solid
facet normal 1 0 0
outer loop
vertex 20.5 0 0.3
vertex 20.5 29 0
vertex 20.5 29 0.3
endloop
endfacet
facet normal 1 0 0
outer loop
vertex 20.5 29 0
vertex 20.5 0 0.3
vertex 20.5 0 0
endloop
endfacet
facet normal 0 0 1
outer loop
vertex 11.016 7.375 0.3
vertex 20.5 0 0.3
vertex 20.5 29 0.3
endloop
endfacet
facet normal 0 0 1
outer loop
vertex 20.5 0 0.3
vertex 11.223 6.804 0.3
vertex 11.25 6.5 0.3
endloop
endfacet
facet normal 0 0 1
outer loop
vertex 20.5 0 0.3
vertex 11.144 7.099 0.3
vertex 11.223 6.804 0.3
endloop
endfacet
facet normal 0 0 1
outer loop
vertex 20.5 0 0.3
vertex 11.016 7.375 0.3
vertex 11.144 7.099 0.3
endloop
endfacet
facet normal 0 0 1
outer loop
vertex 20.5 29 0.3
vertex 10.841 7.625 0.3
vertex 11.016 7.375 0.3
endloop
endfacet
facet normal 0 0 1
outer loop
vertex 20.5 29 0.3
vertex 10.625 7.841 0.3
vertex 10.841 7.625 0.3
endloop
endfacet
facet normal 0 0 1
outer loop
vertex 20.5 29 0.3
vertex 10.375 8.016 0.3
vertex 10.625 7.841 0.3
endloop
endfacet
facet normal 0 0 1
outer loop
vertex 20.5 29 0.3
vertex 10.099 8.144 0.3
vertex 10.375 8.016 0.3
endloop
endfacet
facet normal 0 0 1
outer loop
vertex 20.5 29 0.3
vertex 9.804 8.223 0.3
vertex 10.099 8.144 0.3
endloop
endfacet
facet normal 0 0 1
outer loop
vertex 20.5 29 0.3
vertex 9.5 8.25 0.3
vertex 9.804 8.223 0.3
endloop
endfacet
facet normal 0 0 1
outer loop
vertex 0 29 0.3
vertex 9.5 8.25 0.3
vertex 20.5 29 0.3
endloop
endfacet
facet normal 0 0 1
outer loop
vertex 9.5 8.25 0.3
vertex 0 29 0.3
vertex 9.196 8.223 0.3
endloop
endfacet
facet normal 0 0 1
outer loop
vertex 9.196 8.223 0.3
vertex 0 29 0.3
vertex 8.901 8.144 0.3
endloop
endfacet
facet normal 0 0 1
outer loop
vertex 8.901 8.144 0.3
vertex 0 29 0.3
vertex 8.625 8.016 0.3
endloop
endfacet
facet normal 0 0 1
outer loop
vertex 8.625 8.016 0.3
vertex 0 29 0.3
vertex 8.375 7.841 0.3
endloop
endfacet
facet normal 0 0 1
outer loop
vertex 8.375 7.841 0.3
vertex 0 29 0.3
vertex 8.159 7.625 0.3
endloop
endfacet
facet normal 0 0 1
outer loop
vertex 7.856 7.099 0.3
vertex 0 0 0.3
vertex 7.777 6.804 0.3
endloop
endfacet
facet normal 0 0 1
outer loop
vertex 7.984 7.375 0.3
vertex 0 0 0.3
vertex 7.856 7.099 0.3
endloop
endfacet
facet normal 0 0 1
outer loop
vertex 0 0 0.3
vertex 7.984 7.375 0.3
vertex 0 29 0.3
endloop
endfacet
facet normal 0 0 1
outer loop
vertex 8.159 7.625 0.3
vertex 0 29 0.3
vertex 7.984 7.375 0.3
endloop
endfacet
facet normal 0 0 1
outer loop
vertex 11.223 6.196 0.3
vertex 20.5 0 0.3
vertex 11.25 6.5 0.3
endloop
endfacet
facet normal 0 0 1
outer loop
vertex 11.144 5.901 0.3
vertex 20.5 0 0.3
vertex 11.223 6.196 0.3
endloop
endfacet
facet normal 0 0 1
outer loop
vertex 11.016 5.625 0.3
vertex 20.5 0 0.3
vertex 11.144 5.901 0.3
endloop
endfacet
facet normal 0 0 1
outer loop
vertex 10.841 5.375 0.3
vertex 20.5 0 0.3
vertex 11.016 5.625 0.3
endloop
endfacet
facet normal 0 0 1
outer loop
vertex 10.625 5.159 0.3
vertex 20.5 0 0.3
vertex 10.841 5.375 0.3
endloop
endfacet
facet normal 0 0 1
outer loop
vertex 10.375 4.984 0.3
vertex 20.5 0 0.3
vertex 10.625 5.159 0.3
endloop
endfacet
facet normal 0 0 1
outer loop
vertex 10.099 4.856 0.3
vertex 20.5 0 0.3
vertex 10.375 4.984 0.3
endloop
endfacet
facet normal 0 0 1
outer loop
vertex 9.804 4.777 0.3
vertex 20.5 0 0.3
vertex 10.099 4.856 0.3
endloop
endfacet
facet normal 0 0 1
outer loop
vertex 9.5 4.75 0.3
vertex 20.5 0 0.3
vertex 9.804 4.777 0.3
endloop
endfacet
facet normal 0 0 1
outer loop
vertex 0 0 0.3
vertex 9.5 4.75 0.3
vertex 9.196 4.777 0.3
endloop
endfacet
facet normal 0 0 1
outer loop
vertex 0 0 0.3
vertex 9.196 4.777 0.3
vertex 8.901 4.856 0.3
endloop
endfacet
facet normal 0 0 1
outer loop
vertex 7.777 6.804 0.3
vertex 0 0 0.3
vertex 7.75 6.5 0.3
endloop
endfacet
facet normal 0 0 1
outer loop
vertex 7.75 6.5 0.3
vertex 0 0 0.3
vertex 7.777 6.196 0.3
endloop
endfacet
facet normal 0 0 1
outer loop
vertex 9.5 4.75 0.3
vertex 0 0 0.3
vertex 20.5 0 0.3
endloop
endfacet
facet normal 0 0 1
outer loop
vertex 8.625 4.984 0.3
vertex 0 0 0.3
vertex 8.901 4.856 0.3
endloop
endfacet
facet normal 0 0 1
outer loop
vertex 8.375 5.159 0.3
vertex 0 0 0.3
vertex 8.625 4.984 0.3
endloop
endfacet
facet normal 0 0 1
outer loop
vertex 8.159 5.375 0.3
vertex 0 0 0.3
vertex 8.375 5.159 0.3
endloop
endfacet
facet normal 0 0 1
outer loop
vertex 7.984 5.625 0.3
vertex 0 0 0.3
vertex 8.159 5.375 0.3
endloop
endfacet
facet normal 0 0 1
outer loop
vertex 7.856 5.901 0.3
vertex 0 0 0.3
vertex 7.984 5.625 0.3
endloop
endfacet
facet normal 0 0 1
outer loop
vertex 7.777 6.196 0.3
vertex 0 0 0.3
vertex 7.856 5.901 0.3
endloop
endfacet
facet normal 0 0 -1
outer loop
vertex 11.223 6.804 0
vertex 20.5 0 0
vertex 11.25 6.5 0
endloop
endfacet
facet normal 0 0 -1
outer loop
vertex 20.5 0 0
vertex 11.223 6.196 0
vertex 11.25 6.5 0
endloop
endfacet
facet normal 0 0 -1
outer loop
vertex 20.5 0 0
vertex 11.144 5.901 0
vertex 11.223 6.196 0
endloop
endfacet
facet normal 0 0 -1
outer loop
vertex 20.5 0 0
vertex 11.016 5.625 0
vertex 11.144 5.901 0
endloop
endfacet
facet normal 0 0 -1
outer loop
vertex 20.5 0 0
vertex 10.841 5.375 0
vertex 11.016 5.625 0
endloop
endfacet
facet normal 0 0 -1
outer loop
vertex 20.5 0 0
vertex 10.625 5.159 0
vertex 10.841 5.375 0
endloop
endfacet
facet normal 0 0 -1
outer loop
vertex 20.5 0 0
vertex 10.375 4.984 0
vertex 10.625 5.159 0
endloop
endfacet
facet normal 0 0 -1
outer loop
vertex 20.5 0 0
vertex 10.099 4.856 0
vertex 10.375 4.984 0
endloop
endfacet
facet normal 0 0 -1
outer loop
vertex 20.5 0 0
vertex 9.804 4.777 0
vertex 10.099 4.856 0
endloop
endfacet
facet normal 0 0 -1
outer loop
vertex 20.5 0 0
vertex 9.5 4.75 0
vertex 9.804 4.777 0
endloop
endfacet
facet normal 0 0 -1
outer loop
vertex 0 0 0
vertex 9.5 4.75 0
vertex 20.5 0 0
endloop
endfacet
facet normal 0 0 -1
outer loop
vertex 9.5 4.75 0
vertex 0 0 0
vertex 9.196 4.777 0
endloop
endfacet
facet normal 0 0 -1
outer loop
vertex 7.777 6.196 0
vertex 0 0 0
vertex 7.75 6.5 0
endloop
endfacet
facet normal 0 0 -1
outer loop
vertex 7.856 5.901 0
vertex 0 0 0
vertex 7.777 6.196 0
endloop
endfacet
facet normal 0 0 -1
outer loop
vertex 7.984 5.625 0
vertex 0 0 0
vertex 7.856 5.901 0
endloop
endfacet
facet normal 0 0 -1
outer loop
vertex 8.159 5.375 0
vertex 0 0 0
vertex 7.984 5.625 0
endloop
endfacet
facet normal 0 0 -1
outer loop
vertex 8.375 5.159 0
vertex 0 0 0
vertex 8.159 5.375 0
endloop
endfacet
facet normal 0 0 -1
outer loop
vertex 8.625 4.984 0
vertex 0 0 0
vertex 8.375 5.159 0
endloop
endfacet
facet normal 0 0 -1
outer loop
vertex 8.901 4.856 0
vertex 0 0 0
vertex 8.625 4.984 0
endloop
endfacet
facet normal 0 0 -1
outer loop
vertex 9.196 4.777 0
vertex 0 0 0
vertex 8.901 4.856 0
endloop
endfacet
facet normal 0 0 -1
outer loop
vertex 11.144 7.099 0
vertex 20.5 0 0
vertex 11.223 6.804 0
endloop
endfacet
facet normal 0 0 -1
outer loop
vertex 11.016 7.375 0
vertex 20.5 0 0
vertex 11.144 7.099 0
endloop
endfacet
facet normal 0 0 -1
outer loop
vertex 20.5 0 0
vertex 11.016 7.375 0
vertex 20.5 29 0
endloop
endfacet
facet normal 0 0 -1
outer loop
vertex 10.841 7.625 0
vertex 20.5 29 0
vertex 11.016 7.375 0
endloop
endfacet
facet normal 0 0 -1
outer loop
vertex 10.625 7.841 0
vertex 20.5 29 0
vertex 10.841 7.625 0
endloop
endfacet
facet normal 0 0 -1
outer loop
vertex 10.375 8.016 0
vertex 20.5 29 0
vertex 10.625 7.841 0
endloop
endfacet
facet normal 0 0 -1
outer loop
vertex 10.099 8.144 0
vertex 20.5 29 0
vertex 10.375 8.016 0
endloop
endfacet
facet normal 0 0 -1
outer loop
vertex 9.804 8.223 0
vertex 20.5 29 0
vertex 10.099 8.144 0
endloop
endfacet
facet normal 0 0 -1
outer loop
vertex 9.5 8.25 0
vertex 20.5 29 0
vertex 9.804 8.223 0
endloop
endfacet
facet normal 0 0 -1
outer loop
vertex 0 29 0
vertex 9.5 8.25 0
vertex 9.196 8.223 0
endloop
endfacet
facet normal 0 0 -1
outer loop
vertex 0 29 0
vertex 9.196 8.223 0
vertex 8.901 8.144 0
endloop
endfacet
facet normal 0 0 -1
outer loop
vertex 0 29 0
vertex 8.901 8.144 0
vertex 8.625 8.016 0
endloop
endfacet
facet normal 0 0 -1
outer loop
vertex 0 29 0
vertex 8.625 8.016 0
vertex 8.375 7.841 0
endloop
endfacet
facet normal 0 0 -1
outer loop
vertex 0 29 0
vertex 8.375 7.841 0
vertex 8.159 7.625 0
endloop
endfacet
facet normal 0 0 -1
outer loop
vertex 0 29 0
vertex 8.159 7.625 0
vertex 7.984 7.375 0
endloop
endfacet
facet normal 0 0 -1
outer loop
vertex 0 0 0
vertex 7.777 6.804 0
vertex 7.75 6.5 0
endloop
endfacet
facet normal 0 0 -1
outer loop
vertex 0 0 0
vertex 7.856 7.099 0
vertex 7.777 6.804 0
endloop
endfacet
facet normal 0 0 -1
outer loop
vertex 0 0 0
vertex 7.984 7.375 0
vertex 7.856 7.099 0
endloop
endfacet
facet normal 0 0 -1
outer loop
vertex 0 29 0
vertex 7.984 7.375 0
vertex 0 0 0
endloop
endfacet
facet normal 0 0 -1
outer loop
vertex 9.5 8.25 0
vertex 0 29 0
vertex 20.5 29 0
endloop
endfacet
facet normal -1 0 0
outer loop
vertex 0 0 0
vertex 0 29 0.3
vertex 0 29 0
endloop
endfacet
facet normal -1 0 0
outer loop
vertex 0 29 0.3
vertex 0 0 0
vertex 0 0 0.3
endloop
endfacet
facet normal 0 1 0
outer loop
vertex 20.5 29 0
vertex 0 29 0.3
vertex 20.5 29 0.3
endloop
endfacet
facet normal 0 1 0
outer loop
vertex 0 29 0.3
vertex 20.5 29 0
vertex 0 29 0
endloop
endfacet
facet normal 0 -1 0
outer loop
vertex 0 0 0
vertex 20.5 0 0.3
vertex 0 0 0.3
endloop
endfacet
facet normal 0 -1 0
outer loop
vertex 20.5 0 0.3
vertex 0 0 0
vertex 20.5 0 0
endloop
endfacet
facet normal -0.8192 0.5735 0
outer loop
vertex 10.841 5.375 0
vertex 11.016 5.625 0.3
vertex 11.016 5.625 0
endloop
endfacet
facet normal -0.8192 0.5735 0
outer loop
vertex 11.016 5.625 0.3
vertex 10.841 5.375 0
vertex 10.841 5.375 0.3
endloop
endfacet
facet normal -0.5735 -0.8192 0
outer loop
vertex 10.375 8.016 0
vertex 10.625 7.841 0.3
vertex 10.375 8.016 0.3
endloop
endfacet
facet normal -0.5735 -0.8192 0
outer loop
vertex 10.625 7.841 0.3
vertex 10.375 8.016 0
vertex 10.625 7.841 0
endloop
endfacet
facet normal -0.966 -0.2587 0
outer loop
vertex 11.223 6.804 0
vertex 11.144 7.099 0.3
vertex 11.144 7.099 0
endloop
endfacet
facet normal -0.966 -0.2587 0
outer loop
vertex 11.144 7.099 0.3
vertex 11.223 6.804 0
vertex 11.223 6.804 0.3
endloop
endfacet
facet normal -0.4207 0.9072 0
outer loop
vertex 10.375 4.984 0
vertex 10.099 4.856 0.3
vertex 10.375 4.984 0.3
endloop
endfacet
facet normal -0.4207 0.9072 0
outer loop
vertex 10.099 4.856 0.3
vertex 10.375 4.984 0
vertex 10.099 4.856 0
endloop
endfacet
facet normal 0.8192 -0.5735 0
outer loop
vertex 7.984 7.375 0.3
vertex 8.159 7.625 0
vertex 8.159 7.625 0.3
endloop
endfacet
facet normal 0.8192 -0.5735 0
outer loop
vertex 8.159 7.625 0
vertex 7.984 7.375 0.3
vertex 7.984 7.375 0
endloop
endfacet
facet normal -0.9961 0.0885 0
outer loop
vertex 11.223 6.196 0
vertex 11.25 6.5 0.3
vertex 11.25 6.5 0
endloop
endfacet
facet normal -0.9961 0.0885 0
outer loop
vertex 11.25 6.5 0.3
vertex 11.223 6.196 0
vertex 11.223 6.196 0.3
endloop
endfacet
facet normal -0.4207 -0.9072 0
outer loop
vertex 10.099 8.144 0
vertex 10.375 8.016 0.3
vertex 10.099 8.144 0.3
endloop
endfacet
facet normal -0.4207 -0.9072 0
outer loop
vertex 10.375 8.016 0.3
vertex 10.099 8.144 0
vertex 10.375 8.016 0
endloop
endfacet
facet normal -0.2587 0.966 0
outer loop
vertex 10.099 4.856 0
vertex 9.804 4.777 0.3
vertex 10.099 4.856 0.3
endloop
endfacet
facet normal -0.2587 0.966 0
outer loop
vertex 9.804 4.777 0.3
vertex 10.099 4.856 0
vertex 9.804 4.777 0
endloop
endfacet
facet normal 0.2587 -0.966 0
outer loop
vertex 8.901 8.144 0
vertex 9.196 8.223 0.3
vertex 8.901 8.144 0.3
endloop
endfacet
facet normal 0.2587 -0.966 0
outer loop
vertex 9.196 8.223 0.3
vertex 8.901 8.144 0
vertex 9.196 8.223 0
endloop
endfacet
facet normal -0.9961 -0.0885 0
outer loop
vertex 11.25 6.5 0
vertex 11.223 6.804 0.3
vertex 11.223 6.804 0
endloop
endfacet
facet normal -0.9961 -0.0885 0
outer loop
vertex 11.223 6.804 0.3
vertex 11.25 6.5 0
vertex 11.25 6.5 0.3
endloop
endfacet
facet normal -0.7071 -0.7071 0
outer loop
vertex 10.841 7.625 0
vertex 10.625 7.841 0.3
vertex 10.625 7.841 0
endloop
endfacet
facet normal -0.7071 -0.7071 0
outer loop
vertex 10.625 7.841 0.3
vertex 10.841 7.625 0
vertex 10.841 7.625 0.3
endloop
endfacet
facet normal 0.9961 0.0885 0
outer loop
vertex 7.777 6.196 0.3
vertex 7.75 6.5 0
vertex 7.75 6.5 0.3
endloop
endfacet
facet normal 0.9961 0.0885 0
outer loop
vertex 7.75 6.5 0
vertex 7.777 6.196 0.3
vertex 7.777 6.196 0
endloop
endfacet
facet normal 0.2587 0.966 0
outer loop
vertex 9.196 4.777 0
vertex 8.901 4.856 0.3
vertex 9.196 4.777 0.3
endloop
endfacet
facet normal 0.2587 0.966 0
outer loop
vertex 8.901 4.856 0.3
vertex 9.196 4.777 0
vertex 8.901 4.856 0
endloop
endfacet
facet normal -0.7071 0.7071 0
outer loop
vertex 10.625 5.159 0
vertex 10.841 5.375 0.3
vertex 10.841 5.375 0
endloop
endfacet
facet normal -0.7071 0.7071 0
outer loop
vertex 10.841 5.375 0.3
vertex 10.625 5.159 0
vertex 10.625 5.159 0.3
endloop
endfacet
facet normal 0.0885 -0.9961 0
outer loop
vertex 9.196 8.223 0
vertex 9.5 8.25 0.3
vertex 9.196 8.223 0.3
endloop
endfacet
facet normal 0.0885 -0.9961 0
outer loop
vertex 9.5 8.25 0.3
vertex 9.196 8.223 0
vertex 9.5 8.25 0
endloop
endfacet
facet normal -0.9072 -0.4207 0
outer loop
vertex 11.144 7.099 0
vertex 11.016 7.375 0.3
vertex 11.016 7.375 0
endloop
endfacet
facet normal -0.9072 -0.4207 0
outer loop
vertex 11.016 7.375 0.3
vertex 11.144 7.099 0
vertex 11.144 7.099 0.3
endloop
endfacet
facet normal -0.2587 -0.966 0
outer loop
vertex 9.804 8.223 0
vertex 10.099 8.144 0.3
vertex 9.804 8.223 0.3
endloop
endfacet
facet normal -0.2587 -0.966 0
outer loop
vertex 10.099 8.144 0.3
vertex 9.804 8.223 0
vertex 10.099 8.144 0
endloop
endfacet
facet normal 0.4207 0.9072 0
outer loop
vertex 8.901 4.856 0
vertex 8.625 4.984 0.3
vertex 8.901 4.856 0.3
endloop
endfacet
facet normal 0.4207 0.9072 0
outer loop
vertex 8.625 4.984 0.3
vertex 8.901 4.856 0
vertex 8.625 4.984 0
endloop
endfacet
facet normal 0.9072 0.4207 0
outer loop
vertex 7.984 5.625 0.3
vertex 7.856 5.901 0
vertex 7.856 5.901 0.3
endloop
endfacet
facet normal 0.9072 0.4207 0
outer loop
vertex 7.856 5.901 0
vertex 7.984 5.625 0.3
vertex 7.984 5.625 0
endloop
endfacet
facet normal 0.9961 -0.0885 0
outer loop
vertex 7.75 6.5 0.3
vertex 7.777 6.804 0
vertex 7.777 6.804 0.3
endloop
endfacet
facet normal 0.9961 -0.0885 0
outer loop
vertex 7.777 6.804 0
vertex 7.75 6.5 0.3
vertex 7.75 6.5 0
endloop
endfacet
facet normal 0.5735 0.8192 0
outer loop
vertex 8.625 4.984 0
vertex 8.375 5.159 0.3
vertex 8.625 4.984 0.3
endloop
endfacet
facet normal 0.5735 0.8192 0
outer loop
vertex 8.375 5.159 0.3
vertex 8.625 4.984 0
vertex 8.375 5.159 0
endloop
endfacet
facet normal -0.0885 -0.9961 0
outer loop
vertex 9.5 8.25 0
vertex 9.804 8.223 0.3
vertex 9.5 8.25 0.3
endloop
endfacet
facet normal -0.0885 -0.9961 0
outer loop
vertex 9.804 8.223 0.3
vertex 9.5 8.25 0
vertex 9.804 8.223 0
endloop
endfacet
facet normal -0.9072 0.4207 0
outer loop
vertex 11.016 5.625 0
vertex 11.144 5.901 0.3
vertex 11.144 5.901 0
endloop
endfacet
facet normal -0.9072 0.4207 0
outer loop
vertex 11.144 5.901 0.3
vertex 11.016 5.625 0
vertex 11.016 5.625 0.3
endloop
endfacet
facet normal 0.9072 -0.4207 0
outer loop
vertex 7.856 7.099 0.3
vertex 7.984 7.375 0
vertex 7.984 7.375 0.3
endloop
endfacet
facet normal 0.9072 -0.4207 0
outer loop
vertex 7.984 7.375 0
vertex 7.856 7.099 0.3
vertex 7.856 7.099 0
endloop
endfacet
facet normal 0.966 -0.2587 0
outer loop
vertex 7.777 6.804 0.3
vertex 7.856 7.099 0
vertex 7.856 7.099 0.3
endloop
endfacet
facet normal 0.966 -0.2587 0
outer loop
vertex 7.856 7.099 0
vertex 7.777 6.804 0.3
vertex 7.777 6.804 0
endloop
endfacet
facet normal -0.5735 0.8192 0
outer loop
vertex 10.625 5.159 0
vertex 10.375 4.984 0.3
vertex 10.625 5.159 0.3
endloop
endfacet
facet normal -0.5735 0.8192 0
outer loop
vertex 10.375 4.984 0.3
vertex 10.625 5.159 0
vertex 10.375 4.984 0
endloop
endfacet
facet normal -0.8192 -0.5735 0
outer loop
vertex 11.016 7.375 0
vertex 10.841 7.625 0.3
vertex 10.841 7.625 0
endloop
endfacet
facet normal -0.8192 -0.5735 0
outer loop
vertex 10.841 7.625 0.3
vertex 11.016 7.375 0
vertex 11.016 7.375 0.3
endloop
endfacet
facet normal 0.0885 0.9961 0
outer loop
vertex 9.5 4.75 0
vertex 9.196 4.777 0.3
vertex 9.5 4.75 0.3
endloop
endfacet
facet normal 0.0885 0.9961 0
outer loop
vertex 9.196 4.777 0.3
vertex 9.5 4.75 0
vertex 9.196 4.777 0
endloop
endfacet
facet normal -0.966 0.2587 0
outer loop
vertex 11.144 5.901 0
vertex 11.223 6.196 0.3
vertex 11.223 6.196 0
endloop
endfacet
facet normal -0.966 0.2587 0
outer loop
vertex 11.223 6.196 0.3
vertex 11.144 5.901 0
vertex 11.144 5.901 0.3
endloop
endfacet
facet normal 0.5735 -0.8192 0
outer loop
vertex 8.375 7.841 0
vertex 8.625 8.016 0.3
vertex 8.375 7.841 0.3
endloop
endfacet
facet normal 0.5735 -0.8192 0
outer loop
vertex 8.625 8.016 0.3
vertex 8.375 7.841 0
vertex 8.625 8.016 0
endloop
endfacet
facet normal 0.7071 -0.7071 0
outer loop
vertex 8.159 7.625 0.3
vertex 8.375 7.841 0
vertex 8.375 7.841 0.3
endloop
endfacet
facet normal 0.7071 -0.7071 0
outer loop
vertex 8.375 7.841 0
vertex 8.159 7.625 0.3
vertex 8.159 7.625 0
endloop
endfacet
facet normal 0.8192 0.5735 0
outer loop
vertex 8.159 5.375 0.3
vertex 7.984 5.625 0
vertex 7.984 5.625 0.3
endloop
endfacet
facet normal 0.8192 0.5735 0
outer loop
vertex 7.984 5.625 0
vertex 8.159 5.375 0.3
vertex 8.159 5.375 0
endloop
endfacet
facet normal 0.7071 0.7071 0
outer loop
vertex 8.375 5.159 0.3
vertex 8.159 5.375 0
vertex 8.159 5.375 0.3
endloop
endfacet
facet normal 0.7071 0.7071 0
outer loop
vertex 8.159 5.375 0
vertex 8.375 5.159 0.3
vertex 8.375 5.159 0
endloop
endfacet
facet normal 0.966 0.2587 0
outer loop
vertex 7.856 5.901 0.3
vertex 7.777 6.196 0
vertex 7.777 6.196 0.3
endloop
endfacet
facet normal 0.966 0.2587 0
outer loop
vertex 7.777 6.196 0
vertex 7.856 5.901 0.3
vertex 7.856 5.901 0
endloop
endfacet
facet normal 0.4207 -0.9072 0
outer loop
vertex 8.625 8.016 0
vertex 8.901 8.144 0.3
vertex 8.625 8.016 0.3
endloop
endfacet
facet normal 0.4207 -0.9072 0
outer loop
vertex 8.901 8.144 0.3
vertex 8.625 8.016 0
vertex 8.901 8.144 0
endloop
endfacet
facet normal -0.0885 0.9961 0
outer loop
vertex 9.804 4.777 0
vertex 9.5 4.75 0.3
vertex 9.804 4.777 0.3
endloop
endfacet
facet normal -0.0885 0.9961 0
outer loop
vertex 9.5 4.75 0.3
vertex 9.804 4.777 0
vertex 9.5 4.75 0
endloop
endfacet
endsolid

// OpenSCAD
$fn=36;
//Spare2

h=20.5;
i=29;
j=9.5;
k=3.5;

difference()
{
cube([h,i,0.3]);

translate([j,6.5,0])
cylinder(h=1,d1=k,d2=k);
}
